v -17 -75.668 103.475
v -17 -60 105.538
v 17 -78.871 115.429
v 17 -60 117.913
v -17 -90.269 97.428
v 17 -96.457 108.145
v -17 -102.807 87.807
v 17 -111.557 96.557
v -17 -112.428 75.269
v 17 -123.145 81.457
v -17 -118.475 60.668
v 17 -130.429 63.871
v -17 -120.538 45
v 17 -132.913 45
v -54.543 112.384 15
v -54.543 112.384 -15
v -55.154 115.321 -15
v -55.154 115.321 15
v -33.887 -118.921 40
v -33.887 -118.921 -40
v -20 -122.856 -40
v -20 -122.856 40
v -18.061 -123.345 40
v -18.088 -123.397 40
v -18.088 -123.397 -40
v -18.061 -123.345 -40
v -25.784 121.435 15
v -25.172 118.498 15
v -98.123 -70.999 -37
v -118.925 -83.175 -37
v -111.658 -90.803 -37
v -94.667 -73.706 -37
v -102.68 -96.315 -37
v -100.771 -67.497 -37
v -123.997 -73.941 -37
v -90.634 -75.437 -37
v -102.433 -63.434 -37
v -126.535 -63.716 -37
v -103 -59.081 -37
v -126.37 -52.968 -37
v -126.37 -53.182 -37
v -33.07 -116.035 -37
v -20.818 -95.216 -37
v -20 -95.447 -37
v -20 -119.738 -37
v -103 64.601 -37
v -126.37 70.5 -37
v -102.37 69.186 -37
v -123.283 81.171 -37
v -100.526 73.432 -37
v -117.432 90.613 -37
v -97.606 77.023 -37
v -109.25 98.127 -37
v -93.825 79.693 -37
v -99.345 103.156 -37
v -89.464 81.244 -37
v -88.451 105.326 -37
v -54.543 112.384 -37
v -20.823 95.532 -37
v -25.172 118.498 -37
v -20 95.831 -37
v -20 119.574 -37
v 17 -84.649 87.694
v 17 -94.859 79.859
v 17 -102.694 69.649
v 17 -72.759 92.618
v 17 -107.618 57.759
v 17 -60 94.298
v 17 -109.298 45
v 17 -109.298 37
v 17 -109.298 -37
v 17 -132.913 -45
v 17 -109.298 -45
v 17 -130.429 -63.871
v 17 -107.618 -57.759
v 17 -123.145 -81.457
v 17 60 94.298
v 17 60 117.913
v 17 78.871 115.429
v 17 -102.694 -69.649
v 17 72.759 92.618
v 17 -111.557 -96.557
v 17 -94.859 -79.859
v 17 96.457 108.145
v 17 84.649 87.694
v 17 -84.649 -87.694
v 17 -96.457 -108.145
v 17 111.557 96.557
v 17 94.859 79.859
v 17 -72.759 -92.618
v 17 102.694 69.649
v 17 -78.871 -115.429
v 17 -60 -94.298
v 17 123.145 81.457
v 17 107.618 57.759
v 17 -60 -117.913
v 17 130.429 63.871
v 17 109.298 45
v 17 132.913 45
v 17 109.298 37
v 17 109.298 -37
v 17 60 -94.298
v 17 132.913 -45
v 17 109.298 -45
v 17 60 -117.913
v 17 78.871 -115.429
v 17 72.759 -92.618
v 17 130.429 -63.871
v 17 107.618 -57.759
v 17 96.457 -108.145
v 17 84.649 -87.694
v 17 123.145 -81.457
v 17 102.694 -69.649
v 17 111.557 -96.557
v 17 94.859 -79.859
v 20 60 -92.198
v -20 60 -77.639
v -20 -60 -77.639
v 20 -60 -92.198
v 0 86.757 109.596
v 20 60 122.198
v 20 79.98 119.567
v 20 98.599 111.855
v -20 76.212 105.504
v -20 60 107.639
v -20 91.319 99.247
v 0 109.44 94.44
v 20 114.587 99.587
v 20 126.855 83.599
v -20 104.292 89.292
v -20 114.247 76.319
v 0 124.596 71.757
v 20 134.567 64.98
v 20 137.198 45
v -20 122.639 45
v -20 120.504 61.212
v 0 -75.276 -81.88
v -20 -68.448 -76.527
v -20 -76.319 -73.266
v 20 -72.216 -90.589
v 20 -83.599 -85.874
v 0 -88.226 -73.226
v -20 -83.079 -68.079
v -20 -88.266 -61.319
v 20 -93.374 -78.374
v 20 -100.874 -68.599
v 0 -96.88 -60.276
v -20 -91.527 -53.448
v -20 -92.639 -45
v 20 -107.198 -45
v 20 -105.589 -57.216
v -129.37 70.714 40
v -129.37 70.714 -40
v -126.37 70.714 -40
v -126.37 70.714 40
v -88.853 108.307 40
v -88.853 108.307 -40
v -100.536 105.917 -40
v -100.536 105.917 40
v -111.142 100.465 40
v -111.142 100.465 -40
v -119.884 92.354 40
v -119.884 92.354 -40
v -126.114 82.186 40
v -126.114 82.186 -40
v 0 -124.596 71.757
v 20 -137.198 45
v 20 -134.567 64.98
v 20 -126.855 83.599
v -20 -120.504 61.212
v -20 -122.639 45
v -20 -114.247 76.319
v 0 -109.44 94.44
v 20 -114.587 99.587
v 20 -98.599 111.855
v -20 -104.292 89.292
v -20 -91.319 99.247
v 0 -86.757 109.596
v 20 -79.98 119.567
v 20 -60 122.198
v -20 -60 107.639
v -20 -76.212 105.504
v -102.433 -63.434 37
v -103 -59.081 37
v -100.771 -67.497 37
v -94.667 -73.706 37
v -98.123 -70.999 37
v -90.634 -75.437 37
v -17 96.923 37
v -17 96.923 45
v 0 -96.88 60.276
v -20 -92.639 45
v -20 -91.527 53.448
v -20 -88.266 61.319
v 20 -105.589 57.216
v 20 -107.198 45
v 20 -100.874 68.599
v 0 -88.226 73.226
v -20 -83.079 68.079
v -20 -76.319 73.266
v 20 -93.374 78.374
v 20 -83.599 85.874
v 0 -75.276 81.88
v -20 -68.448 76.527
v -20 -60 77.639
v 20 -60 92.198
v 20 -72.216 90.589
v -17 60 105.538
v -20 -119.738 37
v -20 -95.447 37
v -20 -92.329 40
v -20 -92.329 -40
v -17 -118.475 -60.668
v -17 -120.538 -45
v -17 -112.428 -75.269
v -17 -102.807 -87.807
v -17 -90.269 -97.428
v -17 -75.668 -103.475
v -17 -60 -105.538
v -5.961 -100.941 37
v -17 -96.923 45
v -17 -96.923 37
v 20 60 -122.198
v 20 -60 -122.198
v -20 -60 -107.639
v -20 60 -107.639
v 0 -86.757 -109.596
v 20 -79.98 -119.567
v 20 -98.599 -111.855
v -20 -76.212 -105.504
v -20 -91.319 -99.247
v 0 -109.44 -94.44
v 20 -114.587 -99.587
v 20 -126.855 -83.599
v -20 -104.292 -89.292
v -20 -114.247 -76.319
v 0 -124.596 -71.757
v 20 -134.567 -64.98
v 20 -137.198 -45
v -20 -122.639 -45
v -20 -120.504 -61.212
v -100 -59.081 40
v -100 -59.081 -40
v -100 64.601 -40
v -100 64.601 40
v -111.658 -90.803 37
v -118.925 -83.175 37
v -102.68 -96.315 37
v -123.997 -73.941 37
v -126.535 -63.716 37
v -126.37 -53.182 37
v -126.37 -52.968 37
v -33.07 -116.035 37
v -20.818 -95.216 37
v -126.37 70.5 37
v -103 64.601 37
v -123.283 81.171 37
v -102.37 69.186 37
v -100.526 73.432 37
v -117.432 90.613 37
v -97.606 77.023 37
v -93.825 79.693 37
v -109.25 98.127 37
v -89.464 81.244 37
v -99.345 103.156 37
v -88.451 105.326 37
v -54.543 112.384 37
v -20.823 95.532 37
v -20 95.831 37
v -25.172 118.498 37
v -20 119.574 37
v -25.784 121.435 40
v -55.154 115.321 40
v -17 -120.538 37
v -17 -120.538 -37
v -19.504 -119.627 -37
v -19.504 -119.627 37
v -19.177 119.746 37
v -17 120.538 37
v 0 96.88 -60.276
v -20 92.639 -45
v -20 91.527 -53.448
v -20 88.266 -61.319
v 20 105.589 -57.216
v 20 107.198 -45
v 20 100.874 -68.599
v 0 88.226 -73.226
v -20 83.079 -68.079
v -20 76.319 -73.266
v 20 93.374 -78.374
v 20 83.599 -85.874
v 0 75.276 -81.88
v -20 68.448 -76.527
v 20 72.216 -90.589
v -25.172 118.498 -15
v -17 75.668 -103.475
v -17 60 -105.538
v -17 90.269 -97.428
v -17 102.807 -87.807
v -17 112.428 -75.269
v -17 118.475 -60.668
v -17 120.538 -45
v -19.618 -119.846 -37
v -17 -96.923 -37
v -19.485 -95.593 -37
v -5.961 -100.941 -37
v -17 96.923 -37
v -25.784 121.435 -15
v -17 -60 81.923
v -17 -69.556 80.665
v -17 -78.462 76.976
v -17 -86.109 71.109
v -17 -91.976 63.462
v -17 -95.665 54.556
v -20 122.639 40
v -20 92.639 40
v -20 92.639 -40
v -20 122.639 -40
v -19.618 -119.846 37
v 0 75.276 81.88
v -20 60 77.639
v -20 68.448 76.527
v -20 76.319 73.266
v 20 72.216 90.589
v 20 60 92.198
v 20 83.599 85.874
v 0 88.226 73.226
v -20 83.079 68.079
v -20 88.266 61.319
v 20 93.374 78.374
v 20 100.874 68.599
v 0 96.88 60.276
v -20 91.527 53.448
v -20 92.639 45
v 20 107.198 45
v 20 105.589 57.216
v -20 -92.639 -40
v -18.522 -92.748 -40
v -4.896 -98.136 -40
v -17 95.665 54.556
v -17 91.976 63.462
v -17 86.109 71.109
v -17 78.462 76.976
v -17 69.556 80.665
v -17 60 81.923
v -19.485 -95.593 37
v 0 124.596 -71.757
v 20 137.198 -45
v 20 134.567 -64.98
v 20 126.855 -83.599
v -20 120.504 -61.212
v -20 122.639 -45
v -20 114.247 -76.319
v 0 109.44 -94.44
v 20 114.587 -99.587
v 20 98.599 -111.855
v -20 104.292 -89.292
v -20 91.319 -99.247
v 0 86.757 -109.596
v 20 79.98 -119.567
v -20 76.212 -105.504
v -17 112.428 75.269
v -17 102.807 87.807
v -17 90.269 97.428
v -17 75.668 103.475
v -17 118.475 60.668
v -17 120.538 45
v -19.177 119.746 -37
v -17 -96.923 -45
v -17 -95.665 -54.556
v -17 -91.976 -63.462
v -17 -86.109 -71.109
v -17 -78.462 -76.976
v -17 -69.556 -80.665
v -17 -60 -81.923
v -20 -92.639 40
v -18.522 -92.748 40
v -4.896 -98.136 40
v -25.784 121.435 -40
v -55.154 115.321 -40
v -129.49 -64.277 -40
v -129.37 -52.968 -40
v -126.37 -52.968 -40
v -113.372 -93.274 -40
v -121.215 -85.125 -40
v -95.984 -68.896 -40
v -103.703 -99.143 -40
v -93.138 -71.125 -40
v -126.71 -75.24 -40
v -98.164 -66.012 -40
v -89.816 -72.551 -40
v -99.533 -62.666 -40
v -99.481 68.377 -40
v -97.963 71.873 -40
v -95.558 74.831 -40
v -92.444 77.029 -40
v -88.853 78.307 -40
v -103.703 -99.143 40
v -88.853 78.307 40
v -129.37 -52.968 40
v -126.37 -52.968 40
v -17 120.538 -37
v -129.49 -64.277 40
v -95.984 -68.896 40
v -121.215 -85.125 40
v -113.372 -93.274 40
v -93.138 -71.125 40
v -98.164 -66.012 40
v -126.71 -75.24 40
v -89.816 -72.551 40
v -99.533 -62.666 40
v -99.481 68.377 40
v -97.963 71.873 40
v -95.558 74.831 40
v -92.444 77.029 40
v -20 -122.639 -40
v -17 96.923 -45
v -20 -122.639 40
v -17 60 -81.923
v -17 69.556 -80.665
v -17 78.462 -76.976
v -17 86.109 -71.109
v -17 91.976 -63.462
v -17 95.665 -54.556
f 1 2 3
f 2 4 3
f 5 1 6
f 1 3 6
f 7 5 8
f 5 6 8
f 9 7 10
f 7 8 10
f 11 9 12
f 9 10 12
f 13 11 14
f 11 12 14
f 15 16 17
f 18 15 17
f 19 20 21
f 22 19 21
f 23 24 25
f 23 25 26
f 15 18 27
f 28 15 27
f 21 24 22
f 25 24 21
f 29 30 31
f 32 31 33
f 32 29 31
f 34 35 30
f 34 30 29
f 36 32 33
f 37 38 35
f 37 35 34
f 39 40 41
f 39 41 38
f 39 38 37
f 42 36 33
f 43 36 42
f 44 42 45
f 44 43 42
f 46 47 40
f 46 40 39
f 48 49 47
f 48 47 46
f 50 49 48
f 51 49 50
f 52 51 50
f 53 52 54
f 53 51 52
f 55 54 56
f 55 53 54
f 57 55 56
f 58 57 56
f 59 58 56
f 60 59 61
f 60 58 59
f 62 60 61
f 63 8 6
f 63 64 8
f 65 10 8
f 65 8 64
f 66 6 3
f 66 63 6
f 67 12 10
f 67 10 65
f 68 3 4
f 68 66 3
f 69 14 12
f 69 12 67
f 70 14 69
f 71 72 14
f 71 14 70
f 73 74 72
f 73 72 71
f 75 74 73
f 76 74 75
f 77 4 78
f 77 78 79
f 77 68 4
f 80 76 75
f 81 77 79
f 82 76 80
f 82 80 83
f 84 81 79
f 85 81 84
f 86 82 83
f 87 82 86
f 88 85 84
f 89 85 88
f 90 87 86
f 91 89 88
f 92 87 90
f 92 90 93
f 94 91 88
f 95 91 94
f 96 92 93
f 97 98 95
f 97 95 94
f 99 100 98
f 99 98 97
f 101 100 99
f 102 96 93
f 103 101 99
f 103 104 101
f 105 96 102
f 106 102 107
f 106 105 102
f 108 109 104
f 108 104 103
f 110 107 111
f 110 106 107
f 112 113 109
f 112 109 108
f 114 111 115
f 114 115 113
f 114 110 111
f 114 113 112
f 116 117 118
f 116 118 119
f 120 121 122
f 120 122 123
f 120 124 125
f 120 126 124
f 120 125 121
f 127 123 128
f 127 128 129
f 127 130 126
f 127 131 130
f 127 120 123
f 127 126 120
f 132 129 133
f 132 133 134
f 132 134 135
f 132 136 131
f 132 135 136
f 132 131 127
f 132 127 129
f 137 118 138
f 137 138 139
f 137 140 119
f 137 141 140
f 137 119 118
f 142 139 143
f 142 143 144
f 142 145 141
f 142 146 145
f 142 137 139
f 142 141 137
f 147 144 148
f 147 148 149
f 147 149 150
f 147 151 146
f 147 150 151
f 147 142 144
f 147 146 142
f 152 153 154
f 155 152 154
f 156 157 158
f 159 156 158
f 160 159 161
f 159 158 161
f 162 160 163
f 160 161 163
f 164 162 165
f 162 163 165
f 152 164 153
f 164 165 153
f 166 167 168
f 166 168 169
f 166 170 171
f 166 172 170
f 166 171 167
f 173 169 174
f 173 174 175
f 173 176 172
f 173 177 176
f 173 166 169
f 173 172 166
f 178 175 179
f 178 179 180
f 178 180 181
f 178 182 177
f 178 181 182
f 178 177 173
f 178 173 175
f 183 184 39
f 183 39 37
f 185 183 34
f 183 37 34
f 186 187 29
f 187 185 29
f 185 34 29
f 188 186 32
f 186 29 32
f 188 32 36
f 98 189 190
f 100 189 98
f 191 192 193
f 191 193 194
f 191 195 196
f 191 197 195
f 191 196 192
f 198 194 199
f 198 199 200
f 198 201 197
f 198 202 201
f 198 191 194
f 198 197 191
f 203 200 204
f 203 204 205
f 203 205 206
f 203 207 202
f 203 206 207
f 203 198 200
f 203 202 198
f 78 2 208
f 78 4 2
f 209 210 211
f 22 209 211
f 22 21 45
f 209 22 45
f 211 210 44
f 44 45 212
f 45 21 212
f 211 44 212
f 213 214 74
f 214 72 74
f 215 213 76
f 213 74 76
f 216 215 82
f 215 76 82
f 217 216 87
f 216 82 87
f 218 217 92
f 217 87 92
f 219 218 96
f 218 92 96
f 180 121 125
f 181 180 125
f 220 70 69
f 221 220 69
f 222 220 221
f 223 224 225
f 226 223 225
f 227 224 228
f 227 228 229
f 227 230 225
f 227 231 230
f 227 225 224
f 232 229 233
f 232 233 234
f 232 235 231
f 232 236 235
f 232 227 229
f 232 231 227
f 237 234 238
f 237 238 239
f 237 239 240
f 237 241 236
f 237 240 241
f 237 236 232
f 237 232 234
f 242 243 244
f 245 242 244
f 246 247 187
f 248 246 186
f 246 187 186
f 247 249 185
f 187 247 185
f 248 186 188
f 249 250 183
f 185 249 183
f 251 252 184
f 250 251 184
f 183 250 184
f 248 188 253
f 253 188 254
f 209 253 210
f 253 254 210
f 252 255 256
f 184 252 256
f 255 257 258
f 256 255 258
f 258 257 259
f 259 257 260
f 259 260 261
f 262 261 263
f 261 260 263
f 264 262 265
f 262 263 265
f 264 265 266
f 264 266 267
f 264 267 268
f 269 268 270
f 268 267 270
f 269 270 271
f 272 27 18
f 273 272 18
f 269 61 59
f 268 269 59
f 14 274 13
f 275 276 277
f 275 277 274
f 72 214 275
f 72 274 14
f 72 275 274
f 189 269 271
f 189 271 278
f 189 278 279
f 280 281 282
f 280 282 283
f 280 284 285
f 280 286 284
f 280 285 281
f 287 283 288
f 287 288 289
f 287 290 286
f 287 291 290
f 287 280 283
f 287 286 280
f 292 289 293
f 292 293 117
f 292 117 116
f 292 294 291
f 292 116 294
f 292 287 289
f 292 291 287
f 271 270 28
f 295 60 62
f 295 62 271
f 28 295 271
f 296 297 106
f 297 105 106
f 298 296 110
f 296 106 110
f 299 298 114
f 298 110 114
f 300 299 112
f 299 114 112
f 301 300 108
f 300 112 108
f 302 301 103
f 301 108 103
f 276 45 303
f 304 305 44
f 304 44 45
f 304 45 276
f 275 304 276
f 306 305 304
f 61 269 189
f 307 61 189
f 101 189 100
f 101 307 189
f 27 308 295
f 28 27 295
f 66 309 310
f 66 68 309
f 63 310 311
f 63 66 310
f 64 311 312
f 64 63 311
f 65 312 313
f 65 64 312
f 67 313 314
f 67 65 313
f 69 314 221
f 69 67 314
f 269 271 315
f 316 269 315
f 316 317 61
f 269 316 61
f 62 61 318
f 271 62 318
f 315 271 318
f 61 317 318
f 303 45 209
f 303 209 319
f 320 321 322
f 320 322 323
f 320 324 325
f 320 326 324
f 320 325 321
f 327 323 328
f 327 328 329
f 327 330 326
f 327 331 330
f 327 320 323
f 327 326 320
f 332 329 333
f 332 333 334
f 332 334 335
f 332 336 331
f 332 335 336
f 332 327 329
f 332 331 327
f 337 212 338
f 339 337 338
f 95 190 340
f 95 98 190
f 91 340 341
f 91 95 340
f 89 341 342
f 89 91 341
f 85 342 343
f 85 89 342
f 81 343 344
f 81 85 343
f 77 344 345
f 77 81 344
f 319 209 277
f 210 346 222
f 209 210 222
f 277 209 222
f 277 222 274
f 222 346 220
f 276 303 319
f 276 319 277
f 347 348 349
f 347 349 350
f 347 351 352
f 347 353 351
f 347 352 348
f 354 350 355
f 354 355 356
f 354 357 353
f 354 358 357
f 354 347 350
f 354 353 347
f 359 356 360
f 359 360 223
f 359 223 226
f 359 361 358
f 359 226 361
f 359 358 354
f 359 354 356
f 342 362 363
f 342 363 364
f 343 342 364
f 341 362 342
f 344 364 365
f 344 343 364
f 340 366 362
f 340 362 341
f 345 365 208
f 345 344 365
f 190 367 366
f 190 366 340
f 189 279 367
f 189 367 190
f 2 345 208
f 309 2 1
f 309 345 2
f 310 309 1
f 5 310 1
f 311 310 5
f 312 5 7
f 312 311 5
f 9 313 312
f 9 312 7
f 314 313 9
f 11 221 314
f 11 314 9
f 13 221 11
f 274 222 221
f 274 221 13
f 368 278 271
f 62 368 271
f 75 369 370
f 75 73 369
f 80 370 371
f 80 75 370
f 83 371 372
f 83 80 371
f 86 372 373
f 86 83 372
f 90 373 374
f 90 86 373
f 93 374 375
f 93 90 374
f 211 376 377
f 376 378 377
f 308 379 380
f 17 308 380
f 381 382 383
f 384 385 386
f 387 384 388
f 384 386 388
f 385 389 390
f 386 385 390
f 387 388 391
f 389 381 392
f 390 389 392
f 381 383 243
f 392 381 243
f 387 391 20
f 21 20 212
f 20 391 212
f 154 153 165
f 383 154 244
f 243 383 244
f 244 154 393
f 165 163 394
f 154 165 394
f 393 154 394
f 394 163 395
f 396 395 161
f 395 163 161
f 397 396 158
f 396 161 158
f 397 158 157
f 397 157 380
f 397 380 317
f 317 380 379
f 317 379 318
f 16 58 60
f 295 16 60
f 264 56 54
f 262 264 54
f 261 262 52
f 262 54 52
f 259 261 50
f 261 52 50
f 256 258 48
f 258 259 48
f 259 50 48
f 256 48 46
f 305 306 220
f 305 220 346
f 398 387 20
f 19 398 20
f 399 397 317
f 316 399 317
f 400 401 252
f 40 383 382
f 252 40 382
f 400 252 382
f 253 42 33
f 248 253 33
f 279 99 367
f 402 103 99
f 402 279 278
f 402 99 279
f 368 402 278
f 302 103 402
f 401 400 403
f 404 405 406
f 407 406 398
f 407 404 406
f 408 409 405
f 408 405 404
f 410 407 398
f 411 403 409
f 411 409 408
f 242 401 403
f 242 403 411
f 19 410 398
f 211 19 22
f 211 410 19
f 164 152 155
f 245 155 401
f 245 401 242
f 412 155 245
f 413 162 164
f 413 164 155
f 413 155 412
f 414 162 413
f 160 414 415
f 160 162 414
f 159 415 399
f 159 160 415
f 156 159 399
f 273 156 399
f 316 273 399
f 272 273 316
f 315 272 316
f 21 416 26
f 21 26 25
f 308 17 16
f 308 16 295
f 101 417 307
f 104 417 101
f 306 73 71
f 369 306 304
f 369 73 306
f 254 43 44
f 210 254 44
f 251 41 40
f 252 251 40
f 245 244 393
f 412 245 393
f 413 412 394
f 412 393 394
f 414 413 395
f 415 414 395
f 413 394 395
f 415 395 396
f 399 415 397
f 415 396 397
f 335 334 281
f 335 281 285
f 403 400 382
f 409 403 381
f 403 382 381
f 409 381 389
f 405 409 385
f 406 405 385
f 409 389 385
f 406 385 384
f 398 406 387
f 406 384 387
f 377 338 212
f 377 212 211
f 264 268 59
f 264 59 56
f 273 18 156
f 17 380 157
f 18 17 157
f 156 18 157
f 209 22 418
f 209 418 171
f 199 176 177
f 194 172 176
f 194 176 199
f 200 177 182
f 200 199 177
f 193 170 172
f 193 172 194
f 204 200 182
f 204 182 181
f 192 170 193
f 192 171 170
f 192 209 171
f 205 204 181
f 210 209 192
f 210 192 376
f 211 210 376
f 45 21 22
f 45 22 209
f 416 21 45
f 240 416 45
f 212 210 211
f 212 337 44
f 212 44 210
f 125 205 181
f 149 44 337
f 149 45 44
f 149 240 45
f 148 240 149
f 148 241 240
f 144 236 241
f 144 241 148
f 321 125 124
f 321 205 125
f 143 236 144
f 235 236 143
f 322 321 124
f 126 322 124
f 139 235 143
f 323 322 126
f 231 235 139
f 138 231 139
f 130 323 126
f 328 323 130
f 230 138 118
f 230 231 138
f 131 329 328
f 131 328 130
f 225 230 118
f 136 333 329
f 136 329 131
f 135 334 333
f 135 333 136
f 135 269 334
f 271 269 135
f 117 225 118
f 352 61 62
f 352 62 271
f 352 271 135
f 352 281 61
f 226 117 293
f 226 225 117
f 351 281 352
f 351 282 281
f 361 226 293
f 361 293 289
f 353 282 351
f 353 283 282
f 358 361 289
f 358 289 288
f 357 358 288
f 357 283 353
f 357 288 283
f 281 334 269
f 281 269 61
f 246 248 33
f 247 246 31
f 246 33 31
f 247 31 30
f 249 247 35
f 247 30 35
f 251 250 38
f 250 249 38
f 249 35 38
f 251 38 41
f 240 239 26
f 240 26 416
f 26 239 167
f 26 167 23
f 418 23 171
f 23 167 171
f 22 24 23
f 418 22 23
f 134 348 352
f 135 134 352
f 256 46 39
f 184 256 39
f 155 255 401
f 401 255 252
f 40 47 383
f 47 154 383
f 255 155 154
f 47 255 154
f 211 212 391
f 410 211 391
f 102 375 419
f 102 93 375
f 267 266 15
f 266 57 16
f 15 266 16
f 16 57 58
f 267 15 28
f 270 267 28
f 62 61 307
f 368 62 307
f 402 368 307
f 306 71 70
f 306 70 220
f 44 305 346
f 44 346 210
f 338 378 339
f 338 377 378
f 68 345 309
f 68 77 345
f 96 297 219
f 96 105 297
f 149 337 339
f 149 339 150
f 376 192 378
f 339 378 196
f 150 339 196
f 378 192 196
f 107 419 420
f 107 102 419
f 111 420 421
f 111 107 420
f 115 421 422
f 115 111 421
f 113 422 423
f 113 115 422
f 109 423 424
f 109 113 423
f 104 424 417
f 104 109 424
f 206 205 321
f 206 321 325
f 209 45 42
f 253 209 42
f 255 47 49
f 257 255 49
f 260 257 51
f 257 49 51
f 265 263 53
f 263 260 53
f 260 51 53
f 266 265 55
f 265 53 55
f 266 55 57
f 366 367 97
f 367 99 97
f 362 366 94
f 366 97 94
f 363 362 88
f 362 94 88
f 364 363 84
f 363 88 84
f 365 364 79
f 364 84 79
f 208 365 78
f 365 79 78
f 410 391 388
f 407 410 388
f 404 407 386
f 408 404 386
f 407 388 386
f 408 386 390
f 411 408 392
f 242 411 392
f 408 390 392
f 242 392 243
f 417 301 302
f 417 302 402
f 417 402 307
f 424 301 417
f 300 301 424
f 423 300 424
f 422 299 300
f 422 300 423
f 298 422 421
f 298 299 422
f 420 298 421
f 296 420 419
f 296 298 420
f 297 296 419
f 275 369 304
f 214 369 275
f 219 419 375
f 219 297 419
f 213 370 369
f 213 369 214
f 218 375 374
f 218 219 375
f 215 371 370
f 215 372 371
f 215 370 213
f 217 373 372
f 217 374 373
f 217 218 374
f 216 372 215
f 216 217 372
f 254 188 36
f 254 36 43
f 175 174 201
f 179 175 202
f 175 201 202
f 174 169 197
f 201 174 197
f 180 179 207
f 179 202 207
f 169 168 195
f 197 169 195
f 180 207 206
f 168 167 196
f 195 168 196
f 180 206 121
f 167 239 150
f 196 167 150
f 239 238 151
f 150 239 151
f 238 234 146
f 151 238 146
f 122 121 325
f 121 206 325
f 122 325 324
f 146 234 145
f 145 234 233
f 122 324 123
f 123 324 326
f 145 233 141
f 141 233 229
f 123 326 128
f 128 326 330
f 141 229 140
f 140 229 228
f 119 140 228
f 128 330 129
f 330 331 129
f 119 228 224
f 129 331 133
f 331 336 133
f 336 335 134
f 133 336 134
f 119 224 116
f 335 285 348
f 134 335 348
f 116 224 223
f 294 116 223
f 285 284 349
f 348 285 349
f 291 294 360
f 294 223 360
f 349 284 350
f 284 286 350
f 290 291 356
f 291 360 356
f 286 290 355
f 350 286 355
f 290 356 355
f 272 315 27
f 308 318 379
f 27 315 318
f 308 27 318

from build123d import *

# Parameters (mm, degrees)
SKETCH3_W          = 80
SKETCH3_H          = 30
SKETCH9_W          = 80
SKETCH9_H          = 1.501624929
CUT_EXTRUDE1_DEPTH = 20
CUT_EXTRUDE1_TAPER = -6
SHELL10_START      = -37
SHELL10_DEPTH      = 74
SHELL10_START_2    = -45
SHELL10_2_DEPTH    = 90
SKETCH10_W         = 30
SKETCH10_H         = 30
CUT_EXTRUDE3_DEPTH = 20
SKETCH12_W         = 80
SKETCH12_H         = 123.681881054
CUT_EXTRUDE6_DEPTH = 3
SPLIT1_START       = -40
SPLIT1_DEPTH       = 80
SPLIT1_2_DEPTH     = 80
SPLIT1_3_DEPTH     = 3
SPLIT1_START_2     = 37
SPLIT1_4_DEPTH     = 3
SPLIT1_START_3     = -37
SPLIT1_5_DEPTH     = 22
SPLIT1_START_4     = 15
SPLIT1_6_DEPTH     = 22


with BuildPart() as part:
    # Sweep1: sweep along a path in Sketch1
    with BuildLine(Plane(origin=(0, 0, 0), x_dir=(0, 0, -1), z_dir=(1, 0, 0))) as sweep1_path:
        Line((-45, 100), (45, 100))
        ThreePointArc((45, 100), (73.284271247, 88.284271247), (85, 60))
        Line((85, 60), (85, -60))
        ThreePointArc((85, -60), (73.284271247, -88.284271247), (45, -100))
        Line((45, -100), (-45, -100))
        ThreePointArc((-45, -100), (-73.284271247, -88.284271247), (-85, -60))
        Line((-85, -60), (-85, 60))
        ThreePointArc((-85, 60), (-73.284271247, 88.284271247), (-45, 100))
    # Sketch2 → Sweep1 (sweep)
    with BuildSketch(Plane.XY):
        Polygon((-20, 92.638796882), (-20, 122.638796882), (20, 137.197606252), (20, 107.197606252), align=None)
    sweep(path=sweep1_path.line)

    # Sweep2: sweep along a path in Sketch4
    with BuildLine(Plane.XY) as sweep2_path:
        Line((-20, 92.638796882), (-88.852967931, 78.306964082))
        ThreePointArc((-88.852967931, 78.306964082), (-96.861435242, 73.43415539), (-100, 64.600740168))
        Line((-100, 64.600740168), (-100, -59.081140886))
        ThreePointArc((-100, -59.081140886), (-97.167430364, -67.524392573), (-89.815928706, -72.551058781))
        Line((-89.815928706, -72.551058781), (-20, -92.32939808))
        Line((-20, -92.32939808), (-4.200687465, -96.805227161))
    # Sketch3 → Sweep2 (sweep)
    with BuildSketch(Plane.ZY.offset(20)):
        with Locations((0, 107.638796882)):
            Rectangle(SKETCH3_W, SKETCH3_H)
    sweep(path=sweep2_path.line)

    # Sketch9 → Cut-Extrude1 (cut)
    with BuildSketch(Plane(origin=(36.421438719, -19.020702104, 0), x_dir=(0, 0, -1), z_dir=(0.88640300284302, -0.4629143728065455, 0))):
        with Locations((0, -88.503815115)):
            Rectangle(SKETCH9_W, SKETCH9_H)
    extrude(amount=-CUT_EXTRUDE1_DEPTH, taper=CUT_EXTRUDE1_TAPER, mode=Mode.SUBTRACT)

    # Shell10: read off the stored shape, not the designer's step
    # Shell10 outline → Shell10 (cut)
    with BuildSketch(Plane.XY.offset(SHELL10_START)):
        with BuildLine():
            Line((-20.822955032, 95.531799063), (17, 109.298228867))
            Line((17, 109.298228867), (17, 132.913162232))
            Line((17, 132.913162232), (-19.177044968, 119.7457947))
            Line((-19.177044968, 119.7457947), (-88.451274667, 105.326275728))
            ThreePointArc((-88.451274667, 105.326275728), (-113.597851914, 94.649643041), (-126.370479816, 70.500092129))
            Line((-126.370479816, 70.500092129), (-126.370479816, -53.181788924))
            ThreePointArc((-126.370479816, -53.181788924), (-121.760302537, -78.722392286), (-102.679618525, -96.315108173))
            Line((-102.679618525, -96.315108173), (-33.069732176, -116.035077188))
            Line((-33.069732176, -116.035077188), (-19.61788718, -119.845885974))
            Line((-19.61788718, -119.845885974), (-19.503553091, -119.626955462))
            Line((-19.503553091, -119.626955462), (17, -132.913162232))
            Line((17, -132.913162232), (17, -109.298228867))
            Line((17, -109.298228867), (-5.960628872, -100.941243398))
            Line((-5.960628872, -100.941243398), (-19.484544128, -95.593482034))
            Line((-19.484544128, -95.593482034), (-20.817699008, -95.215809058))
            Line((-20.817699008, -95.215809058), (-90.633627714, -75.437469759))
            ThreePointArc((-90.633627714, -75.437469759), (-99.560451157, -69.333660792), (-103, -59.081140886))
            Line((-103, -59.081140886), (-103, 64.600740168))
            ThreePointArc((-103, 64.600740168), (-99.188885651, 75.32703008), (-89.464318202, 81.244012064))
            Line((-89.464318202, 81.244012064), (-20.822955032, 95.531799063))
        make_face()
    extrude(amount=SHELL10_DEPTH, mode=Mode.SUBTRACT)

    # Shell10 2 outline → Shell10 2 (cut)
    with BuildSketch(Plane.XY.offset(SHELL10_START_2)):
        Polygon((-17, 120.538174267), (-17, 96.923240902), (17, 109.298228867), (17, 132.913162232), align=None)
        Polygon((17, -109.298228867), (-17, -96.923240902), (-17, -120.538174267), (17, -132.913162232), align=None)
    extrude(amount=SHELL10_2_DEPTH, mode=Mode.SUBTRACT)

    # Shell10 3: loft between two sections, ruled curve by curve
    shell10_3_from = [
        Edge.make_three_point_arc((-17, 60, -105.538174267), (-17, 102.806953545, -87.806953545), (-17, 120.538174267, -45)),
        Edge.make_three_point_arc((-17, 60, -81.923240902), (-17, 86.108674025, -71.108674025), (-17, 96.923240902, -45)),
        Edge.make_three_point_arc((-17, -120.538174267, -45), (-17, -102.806953545, -87.806953545), (-17, -60, -105.538174267)),
        Edge.make_three_point_arc((-17, -96.923240902, -45), (-17, -86.108674025, -71.108674025), (-17, -60, -81.923240902)),
        Edge.make_line((-17, 60, -105.538174267), (-17, -60, -105.538174267)),
        Edge.make_line((-17, -60, -81.923240902), (-17, 60, -81.923240902)),
        Edge.make_line((-17, 96.923240902, -45), (-17, 120.538174267, -45)),
        Edge.make_line((-17, -96.923240902, -45), (-17, -120.538174267, -45)),
    ]
    shell10_3_to = [
        Edge.make_three_point_arc((17, 60, -117.913162232), (17, 111.557391452, -96.557391452), (17, 132.913162232, -45)),
        Edge.make_three_point_arc((17, 60, -94.298228867), (17, 94.859111932, -79.859111932), (17, 109.298228867, -45)),
        Edge.make_three_point_arc((17, -132.913162232, -45), (17, -111.557391452, -96.557391452), (17, -60, -117.913162232)),
        Edge.make_three_point_arc((17, -109.298228867, -45), (17, -94.859111932, -79.859111932), (17, -60, -94.298228867)),
        Edge.make_line((17, 60, -117.913162232), (17, -60, -117.913162232)),
        Edge.make_line((17, -60, -94.298228867), (17, 60, -94.298228867)),
        Edge.make_line((17, 109.298228867, -45), (17, 132.913162232, -45)),
        Edge.make_line((17, -109.298228867, -45), (17, -132.913162232, -45)),
    ]
    shell10_3 = Solid(Shell([*[Face.make_surface_from_curves(shell10_3_from[k], shell10_3_to[k]) for k in range(8)], Face(Wire(shell10_3_from)), Face(Wire(shell10_3_to))]))
    add(shell10_3, mode=Mode.SUBTRACT)

    # Shell10 4: loft between two sections, ruled curve by curve
    shell10_4_from = [
        Edge.make_three_point_arc((-17, -60, 105.538174267), (-17, -102.806953545, 87.806953545), (-17, -120.538174267, 45)),
        Edge.make_three_point_arc((-17, -60, 81.923240902), (-17, -86.108674025, 71.108674025), (-17, -96.923240902, 45)),
        Edge.make_three_point_arc((-17, 120.538174267, 45), (-17, 102.806953545, 87.806953545), (-17, 60, 105.538174267)),
        Edge.make_three_point_arc((-17, 96.923240902, 45), (-17, 86.108674025, 71.108674025), (-17, 60, 81.923240902)),
        Edge.make_line((-17, -60, 105.538174267), (-17, 60, 105.538174267)),
        Edge.make_line((-17, 60, 81.923240902), (-17, -60, 81.923240902)),
        Edge.make_line((-17, -96.923240902, 45), (-17, -120.538174267, 45)),
        Edge.make_line((-17, 96.923240902, 45), (-17, 120.538174267, 45)),
    ]
    shell10_4_to = [
        Edge.make_three_point_arc((17, -60, 117.913162232), (17, -111.557391452, 96.557391452), (17, -132.913162232, 45)),
        Edge.make_three_point_arc((17, -60, 94.298228867), (17, -94.859111932, 79.859111932), (17, -109.298228867, 45)),
        Edge.make_three_point_arc((17, 132.913162232, 45), (17, 111.557391452, 96.557391452), (17, 60, 117.913162232)),
        Edge.make_three_point_arc((17, 109.298228867, 45), (17, 94.859111932, 79.859111932), (17, 60, 94.298228867)),
        Edge.make_line((17, -60, 117.913162232), (17, 60, 117.913162232)),
        Edge.make_line((17, 60, 94.298228867), (17, -60, 94.298228867)),
        Edge.make_line((17, -109.298228867, 45), (17, -132.913162232, 45)),
        Edge.make_line((17, 109.298228867, 45), (17, 132.913162232, 45)),
    ]
    shell10_4 = Solid(Shell([*[Face.make_surface_from_curves(shell10_4_from[k], shell10_4_to[k]) for k in range(8)], Face(Wire(shell10_4_from)), Face(Wire(shell10_4_to))]))
    add(shell10_4, mode=Mode.SUBTRACT)

    # Sketch10 → Cut-Extrude3 (cut)
    with BuildSketch(Plane(origin=(-25.297880457, 121.53603633, 0), x_dir=(0.9790159938689951, 0.2037834236357412, 0), z_dir=(-0.2037834236357412, 0.9790159938689951, 0))):
        with Locations((-15.49634306, 0)):
            Rectangle(SKETCH10_W, SKETCH10_H)
    extrude(amount=-CUT_EXTRUDE3_DEPTH, mode=Mode.SUBTRACT)

    # Sketch12 → Cut-Extrude6 (cut)
    with BuildSketch(Plane.ZY.offset(129.370479816)):
        with Locations((0, 8.87330235)):
            Rectangle(SKETCH12_W, SKETCH12_H)
    extrude(amount=-CUT_EXTRUDE6_DEPTH, mode=Mode.SUBTRACT)

    # Split1: read off the stored shape, not the designer's step
    # Split1 outline → Split1 (cut)
    with BuildSketch(Plane.XY.offset(SPLIT1_START)):
        with BuildLine():
            Line((-20, -92.32939808), (-89.815928706, -72.551058781))
            ThreePointArc((-89.815928706, -72.551058781), (-97.167430364, -67.524392573), (-100, -59.081140886))
            Line((-100, -59.081140886), (-100, 64.600740168))
            ThreePointArc((-100, 64.600740168), (-96.861435242, 73.43415539), (-88.852967931, 78.306964082))
            Line((-88.852967931, 78.306964082), (-20, 92.638796882))
            Line((-20, 92.638796882), (-20, 122.638796882))
            Line((-20, 122.638796882), (-88.852967931, 108.306964082))
            ThreePointArc((-88.852967931, 108.306964082), (-115.790182146, 96.70865948), (-129.370479816, 70.714242877))
            Line((-129.370479816, 70.714242877), (-126.370479816, 70.714242877))
            Line((-126.370479816, 70.714242877), (-126.370479816, -52.967638177))
            Line((-126.370479816, -52.967638177), (-129.370479816, -52.967638177))
            ThreePointArc((-129.370479816, -52.967638177), (-124.282475377, -80.360838108), (-103.70335989, -99.143148866))
            Line((-103.70335989, -99.143148866), (-33.887431184, -118.921488166))
            Line((-33.887431184, -118.921488166), (-20, -122.855695317))
            Line((-20, -122.855695317), (-20, -92.32939808))
        make_face()
    extrude(amount=SPLIT1_DEPTH, mode=Mode.SUBTRACT)


with BuildPart() as body_2:
    # Split1 2 outline → Split1 2 (new body)
    with BuildSketch(Plane.XY.offset(SPLIT1_START)):
        Polygon((-20, 119.574495564), (-20, 122.638796882), (-25.783808251, 121.434889842), (-25.17245798, 118.49784186), align=None)
        with BuildLine():
            Line((-20, 92.638796882), (-20, 95.831330199))
            Line((-20, 95.831330199), (-20.822955032, 95.531799063))
            Line((-20.822955032, 95.531799063), (-89.464318202, 81.244012064))
            ThreePointArc((-89.464318202, 81.244012064), (-99.188885651, 75.32703008), (-103, 64.600740168))
            Line((-103, 64.600740168), (-103, -59.081140886))
            ThreePointArc((-103, -59.081140886), (-99.560451157, -69.333660792), (-90.633627714, -75.437469759))
            Line((-90.633627714, -75.437469759), (-20.817699008, -95.215809058))
            Line((-20.817699008, -95.215809058), (-20, -95.447457175))
            Line((-20, -95.447457175), (-20, -92.32939808))
            Line((-20, -92.32939808), (-89.815928706, -72.551058781))
            ThreePointArc((-89.815928706, -72.551058781), (-97.167430364, -67.524392573), (-100, -59.081140886))
            Line((-100, -59.081140886), (-100, 64.600740168))
            ThreePointArc((-100, 64.600740168), (-96.861435242, 73.43415539), (-88.852967931, 78.306964082))
            Line((-88.852967931, 78.306964082), (-20, 92.638796882))
        make_face()
        with BuildLine():
            Line((-54.542937796, 112.384339151), (-55.154288067, 115.321387133))
            Line((-55.154288067, 115.321387133), (-88.852967931, 108.306964082))
            ThreePointArc((-88.852967931, 108.306964082), (-115.790182146, 96.70865948), (-129.370479816, 70.714242877))
            Line((-129.370479816, 70.714242877), (-126.370479816, 70.714242877))
            Line((-126.370479816, 70.714242877), (-126.370479816, 70.500092129))
            ThreePointArc((-126.370479816, 70.500092129), (-113.597851914, 94.649643041), (-88.451274667, 105.326275728))
            Line((-88.451274667, 105.326275728), (-54.542937796, 112.384339151))
        make_face()
        with BuildLine():
            Line((-126.370479816, -53.181788924), (-126.370479816, -52.967638177))
            Line((-126.370479816, -52.967638177), (-129.370479816, -52.967638177))
            ThreePointArc((-129.370479816, -52.967638177), (-124.282475377, -80.360838108), (-103.70335989, -99.143148866))
            Line((-103.70335989, -99.143148866), (-33.887431184, -118.921488166))
            Line((-33.887431184, -118.921488166), (-20, -122.855695317))
            Line((-20, -122.855695317), (-20, -119.737636222))
            Line((-20, -119.737636222), (-33.069732176, -116.035077188))
            Line((-33.069732176, -116.035077188), (-102.679618525, -96.315108173))
            ThreePointArc((-102.679618525, -96.315108173), (-121.760302537, -78.722392286), (-126.370479816, -53.181788924))
        make_face()
    extrude(amount=SPLIT1_2_DEPTH)

    # Split1 3 outline → Split1 3 (add)
    with BuildSketch(Plane.XY.offset(SPLIT1_START)):
        with BuildLine():
            Line((-20, 95.831330199), (-20, 119.574495564))
            Line((-20, 119.574495564), (-25.17245798, 118.49784186))
            Line((-25.17245798, 118.49784186), (-25.783808251, 121.434889842))
            Line((-25.783808251, 121.434889842), (-55.154288067, 115.321387133))
            Line((-55.154288067, 115.321387133), (-54.542937796, 112.384339151))
            Line((-54.542937796, 112.384339151), (-88.451274667, 105.326275728))
            ThreePointArc((-88.451274667, 105.326275728), (-113.597851914, 94.649643041), (-126.370479816, 70.500092129))
            Line((-126.370479816, 70.500092129), (-126.370479816, -53.181788924))
            ThreePointArc((-126.370479816, -53.181788924), (-121.760302537, -78.722392286), (-102.679618525, -96.315108173))
            Line((-102.679618525, -96.315108173), (-33.069732176, -116.035077188))
            Line((-33.069732176, -116.035077188), (-20, -119.737636222))
            Line((-20, -119.737636222), (-20, -95.447457175))
            Line((-20, -95.447457175), (-20.817699008, -95.215809058))
            Line((-20.817699008, -95.215809058), (-90.633627714, -75.437469759))
            ThreePointArc((-90.633627714, -75.437469759), (-99.560451157, -69.333660792), (-103, -59.081140886))
            Line((-103, -59.081140886), (-103, 64.600740168))
            ThreePointArc((-103, 64.600740168), (-99.188885651, 75.32703008), (-89.464318202, 81.244012064))
            Line((-89.464318202, 81.244012064), (-20.822955032, 95.531799063))
            Line((-20.822955032, 95.531799063), (-20, 95.831330199))
        make_face()
    extrude(amount=SPLIT1_3_DEPTH)

    # Split1 4 outline → Split1 4 (add)
    with BuildSketch(Plane.XY.offset(SPLIT1_START_2)):
        with BuildLine():
            Line((-20, 95.831330199), (-20, 119.574495564))
            Line((-20, 119.574495564), (-25.17245798, 118.49784186))
            Line((-25.17245798, 118.49784186), (-25.783808251, 121.434889842))
            Line((-25.783808251, 121.434889842), (-55.154288067, 115.321387133))
            Line((-55.154288067, 115.321387133), (-54.542937796, 112.384339151))
            Line((-54.542937796, 112.384339151), (-88.451274667, 105.326275728))
            ThreePointArc((-88.451274667, 105.326275728), (-113.597851914, 94.649643041), (-126.370479816, 70.500092129))
            Line((-126.370479816, 70.500092129), (-126.370479816, -53.181788924))
            ThreePointArc((-126.370479816, -53.181788924), (-121.760302537, -78.722392286), (-102.679618525, -96.315108173))
            Line((-102.679618525, -96.315108173), (-33.069732176, -116.035077188))
            Line((-33.069732176, -116.035077188), (-20, -119.737636222))
            Line((-20, -119.737636222), (-20, -95.447457175))
            Line((-20, -95.447457175), (-20.817699008, -95.215809058))
            Line((-20.817699008, -95.215809058), (-90.633627714, -75.437469759))
            ThreePointArc((-90.633627714, -75.437469759), (-99.560451157, -69.333660792), (-103, -59.081140886))
            Line((-103, -59.081140886), (-103, 64.600740168))
            ThreePointArc((-103, 64.600740168), (-99.188885651, 75.32703008), (-89.464318202, 81.244012064))
            Line((-89.464318202, 81.244012064), (-20.822955032, 95.531799063))
            Line((-20.822955032, 95.531799063), (-20, 95.831330199))
        make_face()
    extrude(amount=SPLIT1_4_DEPTH)

    # Split1 5 outline → Split1 5 (add)
    with BuildSketch(Plane.XY.offset(SPLIT1_START_3)):
        Polygon((-25.17245798, 118.49784186), (-25.783808251, 121.434889842), (-55.154288067, 115.321387133), (-54.542937796, 112.384339151), align=None)
    extrude(amount=SPLIT1_5_DEPTH)

    # Split1 6 outline → Split1 6 (add)
    with BuildSketch(Plane.XY.offset(SPLIT1_START_4)):
        Polygon((-25.17245798, 118.49784186), (-25.783808251, 121.434889842), (-55.154288067, 115.321387133), (-54.542937796, 112.384339151), align=None)
    extrude(amount=SPLIT1_6_DEPTH)


solid = Compound([part.part, body_2.part])
